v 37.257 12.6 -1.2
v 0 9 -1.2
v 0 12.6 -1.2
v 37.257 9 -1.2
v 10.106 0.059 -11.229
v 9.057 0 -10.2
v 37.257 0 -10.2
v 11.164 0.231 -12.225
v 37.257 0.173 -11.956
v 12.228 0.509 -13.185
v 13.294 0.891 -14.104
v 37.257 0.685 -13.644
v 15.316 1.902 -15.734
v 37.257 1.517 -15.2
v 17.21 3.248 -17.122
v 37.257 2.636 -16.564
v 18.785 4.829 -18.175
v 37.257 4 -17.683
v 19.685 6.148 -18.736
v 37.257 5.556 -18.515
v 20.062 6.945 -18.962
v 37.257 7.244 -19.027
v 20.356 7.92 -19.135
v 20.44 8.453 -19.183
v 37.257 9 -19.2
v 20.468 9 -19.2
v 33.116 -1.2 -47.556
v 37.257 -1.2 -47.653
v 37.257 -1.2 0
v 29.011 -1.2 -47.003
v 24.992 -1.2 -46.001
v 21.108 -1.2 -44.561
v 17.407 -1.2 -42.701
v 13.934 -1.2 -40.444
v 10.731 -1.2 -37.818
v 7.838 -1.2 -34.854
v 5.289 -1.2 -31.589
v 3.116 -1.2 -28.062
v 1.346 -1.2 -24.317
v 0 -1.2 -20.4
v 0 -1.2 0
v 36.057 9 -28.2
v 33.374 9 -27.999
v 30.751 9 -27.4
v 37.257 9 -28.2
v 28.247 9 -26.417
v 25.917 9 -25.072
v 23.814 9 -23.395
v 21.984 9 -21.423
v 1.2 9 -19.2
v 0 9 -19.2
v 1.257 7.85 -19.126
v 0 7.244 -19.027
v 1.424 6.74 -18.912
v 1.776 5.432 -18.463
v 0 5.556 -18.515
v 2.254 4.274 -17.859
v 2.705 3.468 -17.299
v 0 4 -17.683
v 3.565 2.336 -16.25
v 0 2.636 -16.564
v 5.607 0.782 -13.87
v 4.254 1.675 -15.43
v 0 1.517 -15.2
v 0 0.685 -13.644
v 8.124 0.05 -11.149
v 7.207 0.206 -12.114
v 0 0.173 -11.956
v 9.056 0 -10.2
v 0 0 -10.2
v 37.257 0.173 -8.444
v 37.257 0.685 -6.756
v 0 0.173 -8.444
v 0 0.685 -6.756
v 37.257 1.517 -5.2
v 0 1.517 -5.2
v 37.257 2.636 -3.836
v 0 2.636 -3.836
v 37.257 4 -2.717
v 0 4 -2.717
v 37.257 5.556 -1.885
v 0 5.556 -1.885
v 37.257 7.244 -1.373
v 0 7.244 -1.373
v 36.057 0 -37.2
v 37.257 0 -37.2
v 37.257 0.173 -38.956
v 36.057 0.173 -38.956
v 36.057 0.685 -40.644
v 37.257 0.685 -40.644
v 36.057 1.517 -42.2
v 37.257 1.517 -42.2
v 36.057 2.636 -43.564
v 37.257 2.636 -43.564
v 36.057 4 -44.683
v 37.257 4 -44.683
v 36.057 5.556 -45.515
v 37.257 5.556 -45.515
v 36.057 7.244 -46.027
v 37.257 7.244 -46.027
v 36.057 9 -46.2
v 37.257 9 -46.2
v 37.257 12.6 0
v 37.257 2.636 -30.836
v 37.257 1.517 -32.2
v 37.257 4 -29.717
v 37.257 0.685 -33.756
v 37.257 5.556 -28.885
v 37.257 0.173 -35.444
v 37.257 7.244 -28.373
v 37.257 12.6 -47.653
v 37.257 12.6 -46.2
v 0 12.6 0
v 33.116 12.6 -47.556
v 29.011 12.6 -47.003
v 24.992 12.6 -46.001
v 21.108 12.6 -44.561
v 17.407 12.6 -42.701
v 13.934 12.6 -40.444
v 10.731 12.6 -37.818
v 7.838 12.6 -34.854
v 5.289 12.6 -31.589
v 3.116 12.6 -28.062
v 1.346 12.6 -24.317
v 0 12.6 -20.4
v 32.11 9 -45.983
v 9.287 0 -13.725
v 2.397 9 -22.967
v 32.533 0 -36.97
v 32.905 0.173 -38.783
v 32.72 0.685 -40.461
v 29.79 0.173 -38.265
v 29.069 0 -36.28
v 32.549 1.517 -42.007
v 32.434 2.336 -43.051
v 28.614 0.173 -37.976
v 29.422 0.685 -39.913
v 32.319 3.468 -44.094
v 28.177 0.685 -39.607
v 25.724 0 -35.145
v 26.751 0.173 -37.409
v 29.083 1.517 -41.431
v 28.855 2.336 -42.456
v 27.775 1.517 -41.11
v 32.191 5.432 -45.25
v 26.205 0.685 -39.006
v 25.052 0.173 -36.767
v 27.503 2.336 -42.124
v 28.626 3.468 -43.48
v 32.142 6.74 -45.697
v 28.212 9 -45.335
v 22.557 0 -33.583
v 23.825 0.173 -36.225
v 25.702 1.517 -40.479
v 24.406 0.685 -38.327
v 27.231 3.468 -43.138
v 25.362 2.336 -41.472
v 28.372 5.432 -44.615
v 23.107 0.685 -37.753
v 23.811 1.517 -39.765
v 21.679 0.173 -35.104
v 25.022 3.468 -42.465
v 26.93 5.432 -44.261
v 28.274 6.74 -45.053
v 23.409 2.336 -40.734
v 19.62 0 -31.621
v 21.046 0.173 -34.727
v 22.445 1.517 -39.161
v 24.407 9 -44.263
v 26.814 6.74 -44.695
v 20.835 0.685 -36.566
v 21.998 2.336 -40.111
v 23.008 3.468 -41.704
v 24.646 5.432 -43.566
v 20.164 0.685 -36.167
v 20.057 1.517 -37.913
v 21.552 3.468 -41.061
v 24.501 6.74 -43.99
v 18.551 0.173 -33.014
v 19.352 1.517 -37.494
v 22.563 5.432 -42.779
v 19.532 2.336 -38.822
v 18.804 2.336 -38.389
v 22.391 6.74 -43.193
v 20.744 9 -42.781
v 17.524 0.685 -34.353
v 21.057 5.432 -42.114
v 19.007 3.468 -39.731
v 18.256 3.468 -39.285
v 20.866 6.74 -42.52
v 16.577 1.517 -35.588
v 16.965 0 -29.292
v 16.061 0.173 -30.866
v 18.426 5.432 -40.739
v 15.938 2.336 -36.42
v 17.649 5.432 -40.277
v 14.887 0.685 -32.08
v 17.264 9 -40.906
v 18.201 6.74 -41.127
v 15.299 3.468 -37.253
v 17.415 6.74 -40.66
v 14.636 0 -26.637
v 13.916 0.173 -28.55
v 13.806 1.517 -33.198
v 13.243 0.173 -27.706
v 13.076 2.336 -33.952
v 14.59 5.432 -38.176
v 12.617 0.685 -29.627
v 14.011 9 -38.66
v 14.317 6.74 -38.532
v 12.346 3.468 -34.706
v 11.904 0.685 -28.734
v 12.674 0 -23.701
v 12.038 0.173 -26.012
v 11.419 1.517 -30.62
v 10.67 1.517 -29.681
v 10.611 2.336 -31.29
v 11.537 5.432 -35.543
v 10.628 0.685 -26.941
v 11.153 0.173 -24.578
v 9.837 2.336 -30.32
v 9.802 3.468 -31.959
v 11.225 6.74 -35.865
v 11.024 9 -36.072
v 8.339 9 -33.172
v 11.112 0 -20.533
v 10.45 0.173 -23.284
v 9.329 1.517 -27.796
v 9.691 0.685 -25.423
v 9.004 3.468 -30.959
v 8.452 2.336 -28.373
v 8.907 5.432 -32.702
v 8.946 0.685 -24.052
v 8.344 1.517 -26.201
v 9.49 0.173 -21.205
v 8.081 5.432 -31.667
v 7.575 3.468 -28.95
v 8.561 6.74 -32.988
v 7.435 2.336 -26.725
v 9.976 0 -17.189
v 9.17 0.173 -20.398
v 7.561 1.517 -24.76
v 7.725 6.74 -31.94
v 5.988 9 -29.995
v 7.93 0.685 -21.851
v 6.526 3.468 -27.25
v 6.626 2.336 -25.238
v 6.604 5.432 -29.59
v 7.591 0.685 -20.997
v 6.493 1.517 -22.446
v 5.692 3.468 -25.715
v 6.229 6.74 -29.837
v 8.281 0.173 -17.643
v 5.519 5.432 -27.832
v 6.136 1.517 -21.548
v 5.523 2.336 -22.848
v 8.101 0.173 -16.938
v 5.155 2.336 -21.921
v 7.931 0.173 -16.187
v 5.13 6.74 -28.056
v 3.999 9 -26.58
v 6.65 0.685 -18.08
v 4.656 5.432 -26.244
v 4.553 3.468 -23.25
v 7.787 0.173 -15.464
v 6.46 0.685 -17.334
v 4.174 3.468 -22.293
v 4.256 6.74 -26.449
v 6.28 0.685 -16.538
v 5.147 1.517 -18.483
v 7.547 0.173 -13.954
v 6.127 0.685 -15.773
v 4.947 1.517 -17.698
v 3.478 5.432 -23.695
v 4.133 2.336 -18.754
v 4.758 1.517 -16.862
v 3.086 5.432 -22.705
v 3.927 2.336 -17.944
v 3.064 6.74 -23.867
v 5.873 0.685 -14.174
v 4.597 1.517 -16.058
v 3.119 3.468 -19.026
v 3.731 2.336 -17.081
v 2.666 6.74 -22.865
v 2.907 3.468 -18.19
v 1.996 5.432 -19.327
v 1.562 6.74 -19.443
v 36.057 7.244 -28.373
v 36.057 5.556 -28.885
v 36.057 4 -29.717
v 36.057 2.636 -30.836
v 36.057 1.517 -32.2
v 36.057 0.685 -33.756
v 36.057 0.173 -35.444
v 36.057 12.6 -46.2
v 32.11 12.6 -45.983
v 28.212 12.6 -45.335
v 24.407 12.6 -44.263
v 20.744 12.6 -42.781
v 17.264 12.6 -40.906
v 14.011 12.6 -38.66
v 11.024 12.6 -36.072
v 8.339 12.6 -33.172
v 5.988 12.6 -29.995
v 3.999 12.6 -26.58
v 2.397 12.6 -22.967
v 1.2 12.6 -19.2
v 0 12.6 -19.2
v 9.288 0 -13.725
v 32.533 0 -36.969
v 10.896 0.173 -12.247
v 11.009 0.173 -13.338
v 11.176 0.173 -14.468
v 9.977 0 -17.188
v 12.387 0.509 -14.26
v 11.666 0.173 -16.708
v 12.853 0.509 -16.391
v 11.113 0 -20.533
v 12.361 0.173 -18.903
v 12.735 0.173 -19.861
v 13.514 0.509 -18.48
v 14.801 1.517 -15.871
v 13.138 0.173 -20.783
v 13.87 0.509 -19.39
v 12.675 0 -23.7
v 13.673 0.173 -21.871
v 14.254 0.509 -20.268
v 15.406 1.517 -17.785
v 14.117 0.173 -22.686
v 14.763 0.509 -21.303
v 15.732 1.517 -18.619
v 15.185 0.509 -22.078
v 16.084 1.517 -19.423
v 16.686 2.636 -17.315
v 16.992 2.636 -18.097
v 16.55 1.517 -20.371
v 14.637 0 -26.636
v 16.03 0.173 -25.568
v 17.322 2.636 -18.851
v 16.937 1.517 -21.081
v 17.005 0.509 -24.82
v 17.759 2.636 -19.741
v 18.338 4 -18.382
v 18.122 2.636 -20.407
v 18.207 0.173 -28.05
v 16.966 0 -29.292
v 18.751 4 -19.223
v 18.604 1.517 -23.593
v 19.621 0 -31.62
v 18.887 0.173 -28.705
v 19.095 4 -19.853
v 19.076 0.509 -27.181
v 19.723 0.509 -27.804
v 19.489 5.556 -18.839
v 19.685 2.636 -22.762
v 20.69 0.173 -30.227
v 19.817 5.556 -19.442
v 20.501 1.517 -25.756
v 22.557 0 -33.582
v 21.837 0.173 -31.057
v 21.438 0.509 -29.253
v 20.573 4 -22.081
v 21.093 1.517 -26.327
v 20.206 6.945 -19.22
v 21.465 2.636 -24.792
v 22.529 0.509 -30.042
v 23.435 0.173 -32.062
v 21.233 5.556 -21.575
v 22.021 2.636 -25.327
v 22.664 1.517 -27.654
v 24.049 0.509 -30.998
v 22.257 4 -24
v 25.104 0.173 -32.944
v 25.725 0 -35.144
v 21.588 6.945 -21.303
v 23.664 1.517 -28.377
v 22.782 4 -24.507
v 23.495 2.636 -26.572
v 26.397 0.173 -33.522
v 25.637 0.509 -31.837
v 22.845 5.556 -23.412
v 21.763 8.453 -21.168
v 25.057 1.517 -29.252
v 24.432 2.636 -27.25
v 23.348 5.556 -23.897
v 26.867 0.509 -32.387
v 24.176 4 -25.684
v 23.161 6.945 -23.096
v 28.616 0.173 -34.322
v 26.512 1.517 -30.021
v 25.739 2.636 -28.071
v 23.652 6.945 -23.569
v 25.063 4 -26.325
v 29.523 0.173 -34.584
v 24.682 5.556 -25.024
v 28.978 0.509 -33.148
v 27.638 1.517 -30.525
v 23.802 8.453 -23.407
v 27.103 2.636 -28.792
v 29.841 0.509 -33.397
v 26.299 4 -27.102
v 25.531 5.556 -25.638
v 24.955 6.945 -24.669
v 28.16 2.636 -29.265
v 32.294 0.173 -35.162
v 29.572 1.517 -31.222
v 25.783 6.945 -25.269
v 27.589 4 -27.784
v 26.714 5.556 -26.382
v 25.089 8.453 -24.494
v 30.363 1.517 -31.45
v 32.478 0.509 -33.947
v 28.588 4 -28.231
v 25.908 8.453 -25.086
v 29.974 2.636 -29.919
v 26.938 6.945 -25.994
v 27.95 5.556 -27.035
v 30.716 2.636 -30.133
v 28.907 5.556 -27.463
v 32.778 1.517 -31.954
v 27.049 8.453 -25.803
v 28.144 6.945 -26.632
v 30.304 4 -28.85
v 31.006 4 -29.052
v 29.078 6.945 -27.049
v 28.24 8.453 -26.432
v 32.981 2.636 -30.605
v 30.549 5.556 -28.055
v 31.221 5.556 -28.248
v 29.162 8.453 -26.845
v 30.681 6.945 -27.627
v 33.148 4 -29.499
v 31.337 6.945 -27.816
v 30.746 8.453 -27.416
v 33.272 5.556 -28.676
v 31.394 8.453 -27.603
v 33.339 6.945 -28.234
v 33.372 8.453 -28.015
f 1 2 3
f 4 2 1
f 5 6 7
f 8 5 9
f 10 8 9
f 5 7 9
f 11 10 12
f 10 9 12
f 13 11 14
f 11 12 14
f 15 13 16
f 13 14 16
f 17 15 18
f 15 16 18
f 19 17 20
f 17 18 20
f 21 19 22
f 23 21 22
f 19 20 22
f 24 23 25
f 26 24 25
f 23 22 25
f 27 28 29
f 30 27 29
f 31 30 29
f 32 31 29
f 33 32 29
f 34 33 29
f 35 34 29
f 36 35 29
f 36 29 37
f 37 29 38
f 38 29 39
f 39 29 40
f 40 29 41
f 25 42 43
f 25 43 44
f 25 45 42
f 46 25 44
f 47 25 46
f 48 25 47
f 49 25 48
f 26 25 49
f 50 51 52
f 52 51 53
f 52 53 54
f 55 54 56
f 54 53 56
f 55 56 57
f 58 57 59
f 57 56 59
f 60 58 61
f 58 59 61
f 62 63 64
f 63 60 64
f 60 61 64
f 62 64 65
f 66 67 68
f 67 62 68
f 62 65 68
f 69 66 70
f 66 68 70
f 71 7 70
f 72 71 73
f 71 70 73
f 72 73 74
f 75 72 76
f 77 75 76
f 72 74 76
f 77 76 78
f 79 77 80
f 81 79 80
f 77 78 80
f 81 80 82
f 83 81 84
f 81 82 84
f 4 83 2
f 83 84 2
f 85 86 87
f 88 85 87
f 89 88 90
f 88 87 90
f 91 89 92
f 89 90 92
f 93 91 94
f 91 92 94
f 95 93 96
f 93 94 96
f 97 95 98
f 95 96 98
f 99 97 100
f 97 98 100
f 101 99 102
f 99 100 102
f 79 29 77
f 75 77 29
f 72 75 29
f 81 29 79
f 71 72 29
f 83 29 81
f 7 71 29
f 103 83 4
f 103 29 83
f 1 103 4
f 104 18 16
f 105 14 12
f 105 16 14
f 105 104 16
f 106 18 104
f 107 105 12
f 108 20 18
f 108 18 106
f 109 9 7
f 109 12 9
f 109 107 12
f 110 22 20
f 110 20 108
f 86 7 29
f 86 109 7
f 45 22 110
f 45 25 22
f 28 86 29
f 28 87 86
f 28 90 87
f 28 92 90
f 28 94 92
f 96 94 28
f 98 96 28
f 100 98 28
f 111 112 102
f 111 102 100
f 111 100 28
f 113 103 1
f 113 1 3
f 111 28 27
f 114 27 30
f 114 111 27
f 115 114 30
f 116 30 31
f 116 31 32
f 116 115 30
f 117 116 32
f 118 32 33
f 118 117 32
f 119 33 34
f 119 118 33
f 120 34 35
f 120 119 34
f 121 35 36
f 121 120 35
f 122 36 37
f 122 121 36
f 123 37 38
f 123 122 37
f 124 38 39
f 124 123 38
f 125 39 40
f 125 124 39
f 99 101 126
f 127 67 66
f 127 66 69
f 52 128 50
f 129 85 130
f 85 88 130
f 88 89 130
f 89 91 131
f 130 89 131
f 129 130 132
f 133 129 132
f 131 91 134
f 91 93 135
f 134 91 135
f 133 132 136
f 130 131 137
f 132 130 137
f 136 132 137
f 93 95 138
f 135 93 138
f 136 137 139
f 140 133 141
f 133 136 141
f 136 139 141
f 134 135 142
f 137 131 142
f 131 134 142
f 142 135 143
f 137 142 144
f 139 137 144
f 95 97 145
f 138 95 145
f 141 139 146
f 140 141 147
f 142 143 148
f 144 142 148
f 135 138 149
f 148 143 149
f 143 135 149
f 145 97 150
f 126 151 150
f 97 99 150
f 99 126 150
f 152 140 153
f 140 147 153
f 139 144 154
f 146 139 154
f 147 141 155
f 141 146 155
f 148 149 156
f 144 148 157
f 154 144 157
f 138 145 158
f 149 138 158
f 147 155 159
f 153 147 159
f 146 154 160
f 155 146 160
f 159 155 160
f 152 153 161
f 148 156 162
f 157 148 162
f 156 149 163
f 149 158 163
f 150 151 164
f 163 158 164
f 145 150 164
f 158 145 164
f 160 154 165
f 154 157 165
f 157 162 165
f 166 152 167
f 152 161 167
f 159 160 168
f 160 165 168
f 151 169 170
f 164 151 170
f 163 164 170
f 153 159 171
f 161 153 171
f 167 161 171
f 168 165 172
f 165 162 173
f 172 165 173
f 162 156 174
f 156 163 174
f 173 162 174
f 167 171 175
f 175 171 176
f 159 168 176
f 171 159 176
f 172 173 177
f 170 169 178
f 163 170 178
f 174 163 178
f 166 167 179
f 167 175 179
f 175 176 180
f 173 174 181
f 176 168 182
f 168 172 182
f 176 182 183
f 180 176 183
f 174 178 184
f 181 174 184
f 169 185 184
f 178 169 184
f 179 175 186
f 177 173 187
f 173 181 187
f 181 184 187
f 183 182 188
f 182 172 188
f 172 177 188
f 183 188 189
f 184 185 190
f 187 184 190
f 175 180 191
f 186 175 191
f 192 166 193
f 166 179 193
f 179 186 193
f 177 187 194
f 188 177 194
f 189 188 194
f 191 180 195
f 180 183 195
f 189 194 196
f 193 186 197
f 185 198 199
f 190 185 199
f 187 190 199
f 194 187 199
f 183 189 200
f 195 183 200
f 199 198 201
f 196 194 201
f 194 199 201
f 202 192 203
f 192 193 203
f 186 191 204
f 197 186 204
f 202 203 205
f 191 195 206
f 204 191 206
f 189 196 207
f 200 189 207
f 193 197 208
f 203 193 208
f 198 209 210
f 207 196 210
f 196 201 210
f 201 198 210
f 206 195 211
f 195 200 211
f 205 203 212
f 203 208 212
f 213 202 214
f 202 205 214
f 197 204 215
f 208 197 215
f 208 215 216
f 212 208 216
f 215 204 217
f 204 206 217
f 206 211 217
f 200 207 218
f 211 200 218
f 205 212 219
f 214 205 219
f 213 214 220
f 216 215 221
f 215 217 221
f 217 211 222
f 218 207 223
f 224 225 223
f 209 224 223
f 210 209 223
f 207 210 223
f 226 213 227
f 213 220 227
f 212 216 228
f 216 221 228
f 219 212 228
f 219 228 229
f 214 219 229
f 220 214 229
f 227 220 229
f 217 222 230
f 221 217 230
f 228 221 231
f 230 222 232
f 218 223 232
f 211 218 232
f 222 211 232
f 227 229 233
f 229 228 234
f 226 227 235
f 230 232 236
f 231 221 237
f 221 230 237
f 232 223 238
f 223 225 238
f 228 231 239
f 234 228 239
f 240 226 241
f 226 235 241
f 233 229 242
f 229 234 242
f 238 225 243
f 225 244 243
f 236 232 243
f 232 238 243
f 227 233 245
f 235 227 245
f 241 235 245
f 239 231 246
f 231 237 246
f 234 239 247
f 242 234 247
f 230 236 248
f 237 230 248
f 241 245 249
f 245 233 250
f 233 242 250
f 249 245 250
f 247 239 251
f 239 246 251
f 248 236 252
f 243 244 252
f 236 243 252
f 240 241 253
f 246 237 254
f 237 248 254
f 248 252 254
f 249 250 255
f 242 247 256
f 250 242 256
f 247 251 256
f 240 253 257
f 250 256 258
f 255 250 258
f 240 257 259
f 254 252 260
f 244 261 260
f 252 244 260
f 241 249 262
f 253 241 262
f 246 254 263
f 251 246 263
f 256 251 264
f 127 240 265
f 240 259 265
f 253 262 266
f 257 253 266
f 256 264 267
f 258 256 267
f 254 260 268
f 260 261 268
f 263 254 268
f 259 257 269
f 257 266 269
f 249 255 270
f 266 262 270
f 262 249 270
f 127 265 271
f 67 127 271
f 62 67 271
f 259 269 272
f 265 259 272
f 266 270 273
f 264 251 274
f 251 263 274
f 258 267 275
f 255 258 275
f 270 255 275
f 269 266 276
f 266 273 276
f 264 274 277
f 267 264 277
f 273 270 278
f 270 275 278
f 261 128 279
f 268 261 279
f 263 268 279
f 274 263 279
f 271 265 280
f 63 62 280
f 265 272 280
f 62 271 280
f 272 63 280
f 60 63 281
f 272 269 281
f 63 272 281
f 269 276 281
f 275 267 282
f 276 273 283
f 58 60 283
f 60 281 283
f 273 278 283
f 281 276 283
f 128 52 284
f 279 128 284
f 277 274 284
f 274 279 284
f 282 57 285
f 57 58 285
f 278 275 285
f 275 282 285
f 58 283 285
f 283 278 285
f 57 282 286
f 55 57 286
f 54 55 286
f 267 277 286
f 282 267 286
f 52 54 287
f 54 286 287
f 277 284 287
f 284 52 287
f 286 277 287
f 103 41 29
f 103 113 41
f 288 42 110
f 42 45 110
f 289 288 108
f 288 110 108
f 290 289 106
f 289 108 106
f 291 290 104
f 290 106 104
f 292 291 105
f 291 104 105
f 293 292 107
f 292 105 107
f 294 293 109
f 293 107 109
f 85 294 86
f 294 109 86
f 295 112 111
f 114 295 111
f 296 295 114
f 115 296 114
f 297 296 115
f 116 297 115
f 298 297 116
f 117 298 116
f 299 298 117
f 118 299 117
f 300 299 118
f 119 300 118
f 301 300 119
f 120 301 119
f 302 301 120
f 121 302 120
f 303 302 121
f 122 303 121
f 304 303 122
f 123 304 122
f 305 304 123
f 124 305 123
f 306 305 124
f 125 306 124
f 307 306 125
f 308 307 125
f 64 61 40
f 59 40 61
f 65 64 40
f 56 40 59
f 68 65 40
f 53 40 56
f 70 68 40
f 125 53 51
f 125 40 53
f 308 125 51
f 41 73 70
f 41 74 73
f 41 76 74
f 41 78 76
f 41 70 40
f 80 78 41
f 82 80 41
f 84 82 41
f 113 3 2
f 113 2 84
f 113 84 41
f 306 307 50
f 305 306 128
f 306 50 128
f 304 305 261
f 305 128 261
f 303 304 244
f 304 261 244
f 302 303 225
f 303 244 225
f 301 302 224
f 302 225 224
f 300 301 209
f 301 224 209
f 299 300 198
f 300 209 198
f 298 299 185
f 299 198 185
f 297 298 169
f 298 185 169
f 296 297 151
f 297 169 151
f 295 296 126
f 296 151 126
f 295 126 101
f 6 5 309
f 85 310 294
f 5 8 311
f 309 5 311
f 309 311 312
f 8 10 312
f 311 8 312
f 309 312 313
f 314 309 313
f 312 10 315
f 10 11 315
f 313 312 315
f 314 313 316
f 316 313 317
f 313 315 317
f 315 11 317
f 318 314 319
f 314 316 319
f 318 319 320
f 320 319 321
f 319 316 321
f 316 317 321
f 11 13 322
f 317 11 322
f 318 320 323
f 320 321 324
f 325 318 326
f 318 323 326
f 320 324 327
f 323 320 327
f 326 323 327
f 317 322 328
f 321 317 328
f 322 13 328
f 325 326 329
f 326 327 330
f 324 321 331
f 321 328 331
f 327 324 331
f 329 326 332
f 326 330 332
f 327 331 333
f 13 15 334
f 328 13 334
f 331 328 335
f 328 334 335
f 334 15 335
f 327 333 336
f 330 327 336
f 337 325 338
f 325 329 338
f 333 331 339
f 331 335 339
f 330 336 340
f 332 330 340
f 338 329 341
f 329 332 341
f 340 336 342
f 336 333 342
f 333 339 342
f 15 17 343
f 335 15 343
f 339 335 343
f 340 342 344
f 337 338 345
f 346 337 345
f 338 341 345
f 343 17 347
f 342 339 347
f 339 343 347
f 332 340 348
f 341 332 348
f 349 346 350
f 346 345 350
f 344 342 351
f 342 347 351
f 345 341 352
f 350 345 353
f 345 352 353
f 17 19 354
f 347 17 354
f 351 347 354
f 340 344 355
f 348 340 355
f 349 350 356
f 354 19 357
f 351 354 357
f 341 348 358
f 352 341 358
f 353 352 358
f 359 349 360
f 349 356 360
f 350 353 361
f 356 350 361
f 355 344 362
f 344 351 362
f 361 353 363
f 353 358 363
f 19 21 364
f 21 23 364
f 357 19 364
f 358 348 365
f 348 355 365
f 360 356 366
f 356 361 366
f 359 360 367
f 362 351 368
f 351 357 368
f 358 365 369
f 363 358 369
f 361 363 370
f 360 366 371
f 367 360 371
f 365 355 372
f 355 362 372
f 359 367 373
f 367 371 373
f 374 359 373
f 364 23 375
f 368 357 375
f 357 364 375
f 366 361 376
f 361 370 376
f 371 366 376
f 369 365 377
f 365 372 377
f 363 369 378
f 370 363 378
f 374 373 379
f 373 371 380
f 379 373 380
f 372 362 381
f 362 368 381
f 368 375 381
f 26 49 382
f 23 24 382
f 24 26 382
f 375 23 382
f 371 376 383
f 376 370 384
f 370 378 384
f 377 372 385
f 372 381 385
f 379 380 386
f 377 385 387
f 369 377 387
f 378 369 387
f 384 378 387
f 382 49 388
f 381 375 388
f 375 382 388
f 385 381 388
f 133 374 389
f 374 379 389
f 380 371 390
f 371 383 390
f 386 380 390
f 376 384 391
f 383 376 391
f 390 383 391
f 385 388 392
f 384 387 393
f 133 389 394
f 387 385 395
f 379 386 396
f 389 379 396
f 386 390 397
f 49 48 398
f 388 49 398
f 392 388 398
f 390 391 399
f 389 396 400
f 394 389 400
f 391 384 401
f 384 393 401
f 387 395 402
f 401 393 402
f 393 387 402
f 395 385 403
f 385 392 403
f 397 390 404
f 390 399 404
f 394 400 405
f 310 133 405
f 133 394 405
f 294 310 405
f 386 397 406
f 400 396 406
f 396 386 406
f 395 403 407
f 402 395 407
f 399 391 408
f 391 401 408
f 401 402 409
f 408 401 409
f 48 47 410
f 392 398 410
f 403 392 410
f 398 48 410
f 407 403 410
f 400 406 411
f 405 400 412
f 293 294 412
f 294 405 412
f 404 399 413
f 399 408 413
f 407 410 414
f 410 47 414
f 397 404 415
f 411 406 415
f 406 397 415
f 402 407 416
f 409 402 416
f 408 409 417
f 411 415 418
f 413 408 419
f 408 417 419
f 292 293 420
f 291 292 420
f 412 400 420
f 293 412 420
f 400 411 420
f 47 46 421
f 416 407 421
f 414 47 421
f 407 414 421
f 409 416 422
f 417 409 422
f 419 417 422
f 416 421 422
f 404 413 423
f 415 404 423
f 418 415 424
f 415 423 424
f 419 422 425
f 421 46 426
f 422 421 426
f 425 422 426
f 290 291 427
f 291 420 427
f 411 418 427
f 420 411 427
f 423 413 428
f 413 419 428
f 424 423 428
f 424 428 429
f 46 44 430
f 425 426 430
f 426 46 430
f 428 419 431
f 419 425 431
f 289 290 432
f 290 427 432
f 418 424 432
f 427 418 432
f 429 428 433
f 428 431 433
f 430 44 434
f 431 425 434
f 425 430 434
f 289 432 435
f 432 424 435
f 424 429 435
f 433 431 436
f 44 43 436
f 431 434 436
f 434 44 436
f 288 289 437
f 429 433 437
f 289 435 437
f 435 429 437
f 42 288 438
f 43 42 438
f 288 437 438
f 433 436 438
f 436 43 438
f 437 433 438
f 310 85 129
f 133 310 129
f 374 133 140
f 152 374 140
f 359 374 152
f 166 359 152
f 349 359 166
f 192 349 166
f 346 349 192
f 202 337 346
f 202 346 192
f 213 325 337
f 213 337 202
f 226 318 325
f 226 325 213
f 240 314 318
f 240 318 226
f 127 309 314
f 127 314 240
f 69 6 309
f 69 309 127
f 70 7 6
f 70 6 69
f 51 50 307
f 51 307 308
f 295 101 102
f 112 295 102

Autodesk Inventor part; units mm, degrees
ref_plane "YZ Plane" through (0, 0, 0) normal (1, 0, 0) x (0, 1, 0)
ref_plane "XZ Plane" through (0, 0, 0) normal (0, 1, 0) x (-1, 0, 0)
ref_plane "XY Plane" through (0, 0, 0) normal (0, 0, 1) x (1, 0, 0)
sketch "Esboço1" plane through (0, 0, 0) normal (0, 1, 0) x (-1, 0, 0)
  line L0 (-36.0569, -1.2) -> (-1.2, -1.2)
  line L1 (-36.0569, -1.2) -> (-36.0569, -19.2)
  line L2 (-36.0569, -19.2) -> (-20.4684, -19.2)
  arc A0 (-36.0569, -28.2) -> (-20.4684, -19.2) centre (-36.0569, -10.2) ccw
  line L3 (-36.0569, -28.2) -> (-36.0569, -10.2) construction
  line L4 (-20.4684, -19.2) -> (-36.0569, -10.2) construction
  arc A1 (-36.0569, -46.2) -> (-1.2, -19.2) centre (-36.0569, -10.2) ccw
  line L5 (-36.0569, -28.2) -> (-36.0569, -46.2)
  line L6 (-1.2, -1.2) -> (-1.2, -19.2)
  line L7 (0, 0) -> (-37.2569, 0)
  line L8 (-37.2569, 0) -> (-37.2569, -20.4)
  line L9 (-37.2569, -20.4) -> (-22.7077, -20.4)
  arc A2 (-37.2569, -26.9571) -> (-22.7077, -20.4) centre (-36.0569, -10.2) ccw
  line L10 (-37.2569, -26.9571) -> (-37.2569, -47.6526)
  line L11 (0, -19.2) -> (0, 0)
  line L12 (-36.0569, -28.2) -> (-37.2569, -28.2)
  line L13 (-36.0569, -46.2) -> (-37.2569, -46.2)
  line L14 (-36.0569, -1.2) -> (-37.2569, -1.2)
  line L15 (-36.0569, -19.2) -> (-37.2569, -19.2)
  line L16 (-1.2, -19.2) -> (0, -19.2)
  line L17 (-1.2, -1.2) -> (0, -1.2)
  line L18 (-37.2569, -26.9571) -> (-37.2569, -20.4)
  line L19 (0, -20.4) -> (0, -19.2)
  arc A3 (-37.2569, -47.6526) -> (0, -20.4) centre (-36.0569, -10.2) ccw
  point P0 (-28.2626, -19.2)
  point P1 (-18.6284, 0)
  point P2 (8.0774, -19.7542)
  dimension "d19" = 60
  dimension "d21" = 18
  dimension "d22" = 1.2
  dimension "d32" = 1.2
  dimension "d33" = 1.2
extrude "Extrusão2" add sketch "Esboço1" against normal blind 1.2
extrude "Extrusão3" add sketch "Esboço1" along normal blind 9 contours L14 L8 L7 L11 L17 L0 | L2 A0 L12 L10 A2 L9 L8 L15 | L9 A2 L18
extrude "Extrusão4" add sketch "Esboço1" along normal blind 12.6 contours L14 L8 L7 L11 L17 L0 | L16 L19 A3 L10 L13 A1
fillet "Arredondamento2" radius 9 7 edges at (36.6569, 0, -46.2) (14.0114, 0, -38.6605) (0.6, 0, -19.2) (18.6284, 0, -1.2) (36.6569, 0, -28.2) (27.0569, 0, -25.7885) (28.8626, 0, -19.2)
equation "\"Diâmetro_esfera\" = 18"
equation "\"Filamento\" = 0.4"
equation "\"Margem\" = 3 * Filamento"
properties part number "Receptor" material "Plástico PET"
